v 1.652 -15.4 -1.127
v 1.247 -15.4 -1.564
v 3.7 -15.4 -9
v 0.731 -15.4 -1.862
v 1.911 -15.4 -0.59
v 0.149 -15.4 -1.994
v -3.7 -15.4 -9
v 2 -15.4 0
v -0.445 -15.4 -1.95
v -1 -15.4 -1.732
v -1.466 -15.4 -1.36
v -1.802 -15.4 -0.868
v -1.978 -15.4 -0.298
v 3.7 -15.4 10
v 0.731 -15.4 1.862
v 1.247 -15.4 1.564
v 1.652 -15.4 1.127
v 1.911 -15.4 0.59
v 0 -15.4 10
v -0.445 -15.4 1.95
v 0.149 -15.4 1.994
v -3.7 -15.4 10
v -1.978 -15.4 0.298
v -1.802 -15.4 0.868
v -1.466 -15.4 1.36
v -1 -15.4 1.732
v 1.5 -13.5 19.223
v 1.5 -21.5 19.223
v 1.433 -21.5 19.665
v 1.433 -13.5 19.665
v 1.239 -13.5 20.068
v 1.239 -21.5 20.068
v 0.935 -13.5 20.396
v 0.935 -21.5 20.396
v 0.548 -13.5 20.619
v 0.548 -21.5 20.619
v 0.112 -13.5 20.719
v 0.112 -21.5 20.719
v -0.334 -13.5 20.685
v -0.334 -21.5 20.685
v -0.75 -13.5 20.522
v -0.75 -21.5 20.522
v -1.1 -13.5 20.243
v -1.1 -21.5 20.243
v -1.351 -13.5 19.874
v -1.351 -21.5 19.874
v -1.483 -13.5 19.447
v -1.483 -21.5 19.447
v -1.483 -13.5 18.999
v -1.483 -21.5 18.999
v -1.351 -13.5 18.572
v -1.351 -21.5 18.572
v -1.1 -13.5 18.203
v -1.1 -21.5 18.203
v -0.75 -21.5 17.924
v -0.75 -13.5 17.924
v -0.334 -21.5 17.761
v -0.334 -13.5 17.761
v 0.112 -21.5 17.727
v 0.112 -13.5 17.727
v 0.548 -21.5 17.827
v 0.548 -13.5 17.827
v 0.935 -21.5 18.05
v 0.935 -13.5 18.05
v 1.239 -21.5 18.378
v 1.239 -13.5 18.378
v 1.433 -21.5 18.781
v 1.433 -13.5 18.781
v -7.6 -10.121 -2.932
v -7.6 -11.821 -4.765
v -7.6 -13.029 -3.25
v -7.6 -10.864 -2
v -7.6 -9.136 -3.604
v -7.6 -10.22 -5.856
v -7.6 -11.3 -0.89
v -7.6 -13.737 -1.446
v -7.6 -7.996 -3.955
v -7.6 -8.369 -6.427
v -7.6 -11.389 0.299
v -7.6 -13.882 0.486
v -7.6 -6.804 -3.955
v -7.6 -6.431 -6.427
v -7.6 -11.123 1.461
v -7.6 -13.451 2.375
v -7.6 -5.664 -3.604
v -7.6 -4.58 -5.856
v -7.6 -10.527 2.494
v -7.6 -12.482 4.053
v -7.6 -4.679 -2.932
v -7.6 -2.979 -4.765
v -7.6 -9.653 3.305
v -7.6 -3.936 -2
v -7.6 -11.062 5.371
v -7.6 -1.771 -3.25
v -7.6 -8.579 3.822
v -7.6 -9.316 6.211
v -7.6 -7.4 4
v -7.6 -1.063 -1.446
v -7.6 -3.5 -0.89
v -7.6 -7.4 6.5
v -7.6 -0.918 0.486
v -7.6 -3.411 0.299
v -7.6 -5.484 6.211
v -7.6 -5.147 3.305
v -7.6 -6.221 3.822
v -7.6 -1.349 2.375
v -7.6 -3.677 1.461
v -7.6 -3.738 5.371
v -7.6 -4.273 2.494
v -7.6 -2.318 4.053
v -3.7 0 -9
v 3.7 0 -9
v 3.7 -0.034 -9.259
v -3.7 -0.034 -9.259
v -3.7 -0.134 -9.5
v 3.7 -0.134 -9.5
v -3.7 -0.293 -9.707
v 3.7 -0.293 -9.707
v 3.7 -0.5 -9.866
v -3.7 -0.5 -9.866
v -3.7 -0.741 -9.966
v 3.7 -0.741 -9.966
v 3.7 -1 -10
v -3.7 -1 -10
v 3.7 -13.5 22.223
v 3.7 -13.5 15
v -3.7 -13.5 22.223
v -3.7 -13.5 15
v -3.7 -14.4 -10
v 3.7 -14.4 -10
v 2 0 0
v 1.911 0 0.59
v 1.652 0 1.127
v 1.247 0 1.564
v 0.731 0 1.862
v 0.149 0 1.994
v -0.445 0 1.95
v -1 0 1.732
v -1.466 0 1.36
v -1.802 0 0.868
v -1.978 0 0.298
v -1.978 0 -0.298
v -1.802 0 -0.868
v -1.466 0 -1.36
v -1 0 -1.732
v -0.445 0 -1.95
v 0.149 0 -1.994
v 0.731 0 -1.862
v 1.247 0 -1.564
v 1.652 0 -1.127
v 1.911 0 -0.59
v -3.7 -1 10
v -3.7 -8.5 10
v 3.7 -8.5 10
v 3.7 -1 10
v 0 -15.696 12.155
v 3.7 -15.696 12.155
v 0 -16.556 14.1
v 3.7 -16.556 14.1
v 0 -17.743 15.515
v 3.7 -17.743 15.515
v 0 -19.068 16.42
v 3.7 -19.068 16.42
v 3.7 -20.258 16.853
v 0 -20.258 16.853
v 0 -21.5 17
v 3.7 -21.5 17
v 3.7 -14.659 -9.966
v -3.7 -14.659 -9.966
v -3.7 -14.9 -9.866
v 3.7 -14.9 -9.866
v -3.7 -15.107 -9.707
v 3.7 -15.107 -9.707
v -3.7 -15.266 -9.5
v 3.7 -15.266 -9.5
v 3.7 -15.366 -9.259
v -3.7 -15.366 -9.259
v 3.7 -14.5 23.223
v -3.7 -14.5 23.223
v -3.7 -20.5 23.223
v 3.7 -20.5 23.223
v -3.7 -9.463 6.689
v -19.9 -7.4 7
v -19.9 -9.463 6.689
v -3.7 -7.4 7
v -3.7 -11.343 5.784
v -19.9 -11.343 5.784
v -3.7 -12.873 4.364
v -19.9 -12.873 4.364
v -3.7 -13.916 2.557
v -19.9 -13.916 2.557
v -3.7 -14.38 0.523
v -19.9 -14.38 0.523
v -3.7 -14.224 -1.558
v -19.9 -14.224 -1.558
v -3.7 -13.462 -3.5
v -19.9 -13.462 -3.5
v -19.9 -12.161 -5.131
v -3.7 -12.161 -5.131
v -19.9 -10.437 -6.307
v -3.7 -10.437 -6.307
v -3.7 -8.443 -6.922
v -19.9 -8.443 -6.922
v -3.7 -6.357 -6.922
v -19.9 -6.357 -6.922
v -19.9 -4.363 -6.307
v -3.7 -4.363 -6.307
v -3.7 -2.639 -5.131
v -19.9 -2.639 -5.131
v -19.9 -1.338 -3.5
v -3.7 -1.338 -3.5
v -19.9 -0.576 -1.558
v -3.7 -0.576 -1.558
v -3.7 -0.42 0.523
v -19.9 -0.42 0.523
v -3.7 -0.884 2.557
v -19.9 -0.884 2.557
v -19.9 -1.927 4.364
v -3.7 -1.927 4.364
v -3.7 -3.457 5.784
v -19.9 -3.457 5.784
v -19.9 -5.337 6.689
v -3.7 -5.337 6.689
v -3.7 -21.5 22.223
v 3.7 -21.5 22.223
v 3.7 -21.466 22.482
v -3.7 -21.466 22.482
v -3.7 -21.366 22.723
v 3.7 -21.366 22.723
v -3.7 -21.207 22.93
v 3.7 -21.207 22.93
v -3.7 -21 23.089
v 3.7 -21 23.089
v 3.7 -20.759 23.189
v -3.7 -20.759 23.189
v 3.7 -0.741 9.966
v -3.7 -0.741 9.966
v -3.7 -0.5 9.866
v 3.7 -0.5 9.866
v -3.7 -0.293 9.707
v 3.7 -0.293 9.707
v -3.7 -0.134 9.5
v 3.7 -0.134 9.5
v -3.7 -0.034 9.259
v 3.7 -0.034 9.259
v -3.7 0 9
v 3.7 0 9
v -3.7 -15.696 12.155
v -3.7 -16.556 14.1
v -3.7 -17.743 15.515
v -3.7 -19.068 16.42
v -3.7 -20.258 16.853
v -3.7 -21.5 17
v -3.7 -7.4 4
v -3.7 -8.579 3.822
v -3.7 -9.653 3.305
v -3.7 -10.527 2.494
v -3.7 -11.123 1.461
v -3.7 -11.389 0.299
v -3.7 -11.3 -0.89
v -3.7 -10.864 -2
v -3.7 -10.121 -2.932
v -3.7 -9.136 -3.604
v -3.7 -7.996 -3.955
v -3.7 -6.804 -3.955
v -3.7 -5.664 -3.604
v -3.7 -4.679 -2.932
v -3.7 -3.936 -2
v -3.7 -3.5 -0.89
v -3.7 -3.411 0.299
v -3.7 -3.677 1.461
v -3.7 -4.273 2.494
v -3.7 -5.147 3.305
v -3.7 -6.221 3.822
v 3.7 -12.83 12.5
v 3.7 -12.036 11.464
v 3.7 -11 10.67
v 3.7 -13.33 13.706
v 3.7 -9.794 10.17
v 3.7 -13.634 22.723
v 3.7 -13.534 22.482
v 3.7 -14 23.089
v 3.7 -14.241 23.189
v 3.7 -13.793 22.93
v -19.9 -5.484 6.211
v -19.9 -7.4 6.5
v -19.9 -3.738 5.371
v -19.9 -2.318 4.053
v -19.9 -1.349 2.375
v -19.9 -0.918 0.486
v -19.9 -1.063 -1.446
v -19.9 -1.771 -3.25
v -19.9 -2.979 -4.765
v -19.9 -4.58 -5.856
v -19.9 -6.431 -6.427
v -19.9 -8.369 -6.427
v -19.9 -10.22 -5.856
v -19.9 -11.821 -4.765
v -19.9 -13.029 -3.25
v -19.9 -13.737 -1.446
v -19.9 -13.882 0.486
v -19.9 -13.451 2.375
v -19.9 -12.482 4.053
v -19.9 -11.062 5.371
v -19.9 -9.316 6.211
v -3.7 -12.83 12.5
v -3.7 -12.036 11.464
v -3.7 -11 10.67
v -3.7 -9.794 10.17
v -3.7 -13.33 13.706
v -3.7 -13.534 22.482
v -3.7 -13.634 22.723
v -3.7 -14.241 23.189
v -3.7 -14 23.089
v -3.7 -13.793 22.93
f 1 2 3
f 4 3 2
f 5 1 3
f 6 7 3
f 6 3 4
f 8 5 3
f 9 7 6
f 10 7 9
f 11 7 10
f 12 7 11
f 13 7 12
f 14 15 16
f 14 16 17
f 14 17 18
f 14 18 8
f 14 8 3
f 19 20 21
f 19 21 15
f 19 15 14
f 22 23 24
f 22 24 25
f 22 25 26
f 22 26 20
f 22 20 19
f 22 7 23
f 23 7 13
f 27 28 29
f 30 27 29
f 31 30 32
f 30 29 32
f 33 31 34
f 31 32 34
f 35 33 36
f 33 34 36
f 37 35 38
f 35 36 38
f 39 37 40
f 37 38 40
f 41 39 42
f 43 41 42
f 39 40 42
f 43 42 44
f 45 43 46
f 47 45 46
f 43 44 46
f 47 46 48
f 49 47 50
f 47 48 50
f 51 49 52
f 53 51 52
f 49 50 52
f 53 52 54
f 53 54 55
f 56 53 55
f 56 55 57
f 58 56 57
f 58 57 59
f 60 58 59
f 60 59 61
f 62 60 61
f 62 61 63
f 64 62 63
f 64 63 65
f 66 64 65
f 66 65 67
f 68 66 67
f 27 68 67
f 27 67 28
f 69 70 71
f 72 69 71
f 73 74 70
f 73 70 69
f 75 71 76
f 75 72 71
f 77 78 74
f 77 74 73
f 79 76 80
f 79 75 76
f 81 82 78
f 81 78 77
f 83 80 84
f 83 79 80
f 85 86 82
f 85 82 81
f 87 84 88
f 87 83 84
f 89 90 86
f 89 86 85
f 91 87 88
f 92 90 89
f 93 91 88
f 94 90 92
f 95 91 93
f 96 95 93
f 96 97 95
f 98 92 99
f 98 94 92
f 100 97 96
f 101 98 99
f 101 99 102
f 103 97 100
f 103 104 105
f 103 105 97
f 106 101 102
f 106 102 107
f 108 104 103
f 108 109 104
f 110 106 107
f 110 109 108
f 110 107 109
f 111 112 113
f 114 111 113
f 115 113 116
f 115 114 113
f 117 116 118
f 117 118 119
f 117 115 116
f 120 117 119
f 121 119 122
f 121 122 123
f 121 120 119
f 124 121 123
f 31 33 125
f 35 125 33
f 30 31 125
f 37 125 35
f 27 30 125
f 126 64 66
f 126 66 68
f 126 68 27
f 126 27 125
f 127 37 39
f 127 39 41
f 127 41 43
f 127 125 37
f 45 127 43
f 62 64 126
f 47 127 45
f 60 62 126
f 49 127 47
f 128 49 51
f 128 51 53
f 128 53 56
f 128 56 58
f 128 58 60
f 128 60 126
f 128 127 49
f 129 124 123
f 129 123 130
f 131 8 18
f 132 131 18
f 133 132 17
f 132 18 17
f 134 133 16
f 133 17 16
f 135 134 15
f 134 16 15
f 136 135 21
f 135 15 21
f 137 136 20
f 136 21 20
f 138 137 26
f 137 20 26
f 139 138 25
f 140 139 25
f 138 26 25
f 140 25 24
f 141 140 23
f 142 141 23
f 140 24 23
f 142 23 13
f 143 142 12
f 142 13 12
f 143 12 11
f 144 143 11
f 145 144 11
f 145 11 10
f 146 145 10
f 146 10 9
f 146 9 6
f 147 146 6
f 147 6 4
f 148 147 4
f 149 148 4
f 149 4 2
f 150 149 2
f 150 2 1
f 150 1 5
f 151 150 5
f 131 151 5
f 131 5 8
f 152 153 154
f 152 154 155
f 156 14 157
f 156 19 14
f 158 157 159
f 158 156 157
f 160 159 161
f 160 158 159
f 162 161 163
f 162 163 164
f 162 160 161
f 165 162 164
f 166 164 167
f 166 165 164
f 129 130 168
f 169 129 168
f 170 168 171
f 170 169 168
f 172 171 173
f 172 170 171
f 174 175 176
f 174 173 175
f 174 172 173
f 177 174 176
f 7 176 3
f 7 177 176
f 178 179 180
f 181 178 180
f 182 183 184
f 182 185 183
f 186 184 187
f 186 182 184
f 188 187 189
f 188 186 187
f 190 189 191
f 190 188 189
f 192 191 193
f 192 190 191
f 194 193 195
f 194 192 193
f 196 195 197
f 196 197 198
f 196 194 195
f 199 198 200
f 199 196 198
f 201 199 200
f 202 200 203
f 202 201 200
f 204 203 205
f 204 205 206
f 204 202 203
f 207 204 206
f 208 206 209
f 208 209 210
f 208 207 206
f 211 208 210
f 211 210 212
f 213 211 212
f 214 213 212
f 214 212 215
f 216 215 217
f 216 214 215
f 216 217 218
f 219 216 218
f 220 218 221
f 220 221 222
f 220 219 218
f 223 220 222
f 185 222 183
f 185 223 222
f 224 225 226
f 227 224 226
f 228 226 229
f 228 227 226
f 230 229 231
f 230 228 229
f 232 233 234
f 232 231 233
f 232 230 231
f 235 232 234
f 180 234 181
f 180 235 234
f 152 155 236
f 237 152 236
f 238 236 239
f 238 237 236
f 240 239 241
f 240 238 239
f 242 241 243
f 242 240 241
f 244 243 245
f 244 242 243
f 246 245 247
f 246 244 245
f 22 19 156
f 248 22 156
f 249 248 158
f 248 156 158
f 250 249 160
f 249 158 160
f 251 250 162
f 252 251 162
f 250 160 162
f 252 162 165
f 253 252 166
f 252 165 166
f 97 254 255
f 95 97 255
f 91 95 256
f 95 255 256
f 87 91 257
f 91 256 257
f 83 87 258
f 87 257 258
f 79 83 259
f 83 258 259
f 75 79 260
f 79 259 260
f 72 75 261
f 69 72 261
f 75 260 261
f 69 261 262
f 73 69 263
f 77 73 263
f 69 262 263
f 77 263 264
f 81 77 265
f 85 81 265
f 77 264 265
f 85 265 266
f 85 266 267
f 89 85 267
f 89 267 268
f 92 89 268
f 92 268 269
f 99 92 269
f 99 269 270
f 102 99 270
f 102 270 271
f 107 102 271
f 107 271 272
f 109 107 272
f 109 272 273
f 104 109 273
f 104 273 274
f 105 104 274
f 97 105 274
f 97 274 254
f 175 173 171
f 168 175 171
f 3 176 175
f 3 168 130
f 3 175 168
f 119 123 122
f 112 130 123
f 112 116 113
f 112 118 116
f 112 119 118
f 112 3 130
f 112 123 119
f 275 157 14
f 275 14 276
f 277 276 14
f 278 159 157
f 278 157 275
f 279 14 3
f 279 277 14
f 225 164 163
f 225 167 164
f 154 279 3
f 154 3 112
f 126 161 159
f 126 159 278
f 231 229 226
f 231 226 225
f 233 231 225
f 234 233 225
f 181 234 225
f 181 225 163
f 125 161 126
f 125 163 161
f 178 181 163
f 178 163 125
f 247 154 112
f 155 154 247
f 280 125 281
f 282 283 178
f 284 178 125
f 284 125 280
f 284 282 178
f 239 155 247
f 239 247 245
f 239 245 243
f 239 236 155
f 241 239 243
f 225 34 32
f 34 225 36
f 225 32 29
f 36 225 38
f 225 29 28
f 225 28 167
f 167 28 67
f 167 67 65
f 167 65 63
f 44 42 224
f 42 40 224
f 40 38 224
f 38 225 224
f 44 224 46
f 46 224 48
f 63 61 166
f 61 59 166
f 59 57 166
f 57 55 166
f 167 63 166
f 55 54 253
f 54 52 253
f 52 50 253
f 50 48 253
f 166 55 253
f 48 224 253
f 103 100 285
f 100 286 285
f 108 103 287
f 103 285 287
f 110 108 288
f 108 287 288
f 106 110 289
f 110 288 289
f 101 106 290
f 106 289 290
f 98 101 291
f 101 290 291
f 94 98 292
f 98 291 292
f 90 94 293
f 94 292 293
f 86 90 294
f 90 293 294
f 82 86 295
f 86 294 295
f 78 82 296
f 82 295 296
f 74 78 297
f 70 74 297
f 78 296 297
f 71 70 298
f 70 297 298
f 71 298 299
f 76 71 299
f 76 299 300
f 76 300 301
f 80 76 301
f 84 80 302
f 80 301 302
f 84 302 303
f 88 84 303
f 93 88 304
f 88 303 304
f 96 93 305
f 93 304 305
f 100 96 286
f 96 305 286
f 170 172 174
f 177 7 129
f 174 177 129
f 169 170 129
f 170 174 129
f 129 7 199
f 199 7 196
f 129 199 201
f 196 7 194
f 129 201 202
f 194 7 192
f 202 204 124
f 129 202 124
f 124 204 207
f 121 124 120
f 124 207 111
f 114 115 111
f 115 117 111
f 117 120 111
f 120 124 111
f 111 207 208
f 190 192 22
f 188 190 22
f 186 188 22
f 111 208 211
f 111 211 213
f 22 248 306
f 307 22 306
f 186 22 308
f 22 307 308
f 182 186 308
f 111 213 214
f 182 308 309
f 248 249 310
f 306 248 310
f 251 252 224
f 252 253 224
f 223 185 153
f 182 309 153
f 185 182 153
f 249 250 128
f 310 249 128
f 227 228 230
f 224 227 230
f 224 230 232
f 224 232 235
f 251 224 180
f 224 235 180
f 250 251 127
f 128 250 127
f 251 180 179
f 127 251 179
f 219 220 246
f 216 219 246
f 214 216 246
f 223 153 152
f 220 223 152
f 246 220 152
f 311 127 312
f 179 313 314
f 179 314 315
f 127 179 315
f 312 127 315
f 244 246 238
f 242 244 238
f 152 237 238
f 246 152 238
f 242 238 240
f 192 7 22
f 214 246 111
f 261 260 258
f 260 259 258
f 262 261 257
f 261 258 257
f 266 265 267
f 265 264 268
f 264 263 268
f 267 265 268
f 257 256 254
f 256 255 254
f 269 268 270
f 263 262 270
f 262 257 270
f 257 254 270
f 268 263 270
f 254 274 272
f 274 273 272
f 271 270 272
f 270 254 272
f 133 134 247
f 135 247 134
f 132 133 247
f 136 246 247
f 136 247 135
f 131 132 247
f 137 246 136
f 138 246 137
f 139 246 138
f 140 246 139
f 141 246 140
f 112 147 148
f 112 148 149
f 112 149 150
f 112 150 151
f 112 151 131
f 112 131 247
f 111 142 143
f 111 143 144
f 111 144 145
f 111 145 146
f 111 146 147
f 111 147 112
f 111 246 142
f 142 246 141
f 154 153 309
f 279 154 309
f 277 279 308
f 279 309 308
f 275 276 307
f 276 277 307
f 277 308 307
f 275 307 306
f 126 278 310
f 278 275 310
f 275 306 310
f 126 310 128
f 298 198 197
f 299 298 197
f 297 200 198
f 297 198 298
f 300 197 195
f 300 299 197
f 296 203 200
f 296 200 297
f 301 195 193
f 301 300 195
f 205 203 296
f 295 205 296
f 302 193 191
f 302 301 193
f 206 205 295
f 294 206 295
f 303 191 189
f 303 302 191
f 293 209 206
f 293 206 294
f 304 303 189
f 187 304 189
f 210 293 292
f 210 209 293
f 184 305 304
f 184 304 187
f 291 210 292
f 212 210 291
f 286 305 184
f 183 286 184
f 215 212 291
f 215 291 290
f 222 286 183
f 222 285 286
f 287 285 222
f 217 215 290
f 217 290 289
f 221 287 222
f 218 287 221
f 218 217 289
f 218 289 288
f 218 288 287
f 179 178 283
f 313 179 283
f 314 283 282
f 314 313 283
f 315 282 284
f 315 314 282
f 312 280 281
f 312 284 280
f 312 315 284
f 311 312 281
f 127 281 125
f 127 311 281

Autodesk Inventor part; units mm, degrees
sketch "Sketch5" plane through (0, 0, 0) normal (1, 0, 0) x (0, 1, 0)
  line L0 (-8.5, 10) -> (0, 10)
  line L1 (0, 10) -> (0, -10)
  line L2 (0, -10) -> (-14.4, -10)
  line L3 (-15.4, -9) -> (-15.4, 10)
  line L4 (-26.0485, 0) -> (4.3414, 0) projected
  line L5 (0, -16.9345) -> (0, 30.1575) projected
  line L6 (-14.5, 23.223) -> (-20.5, 23.223)
  line L7 (-21.5, 22.223) -> (-21.5, 17)
  ellipse E0 centre (-21.5, 10) end of major axis (-21.5, 17) minor radius 6.1 (-15.4, 10) -> (-21.5, 17) ccw
  line L8 (-13.5, 22.223) -> (-13.5, 15)
  arc A0 (-20.5, 23.223) -> (-21.5, 22.223) centre (-20.5, 22.223) ccw
  arc A1 (-13.5, 22.223) -> (-14.5, 23.223) centre (-14.5, 22.223) ccw
  arc A2 (-15.4, -9) -> (-14.4, -10) centre (-14.4, -9) ccw
  arc A3 (-13.5, 15) -> (-8.5, 10) centre (-8.5, 15) ccw
  point P0 (0, 0)
  point P1 (-15.4, -10)
  point P2 (-13.5, 10)
  dimension "d64" = 6.1
  dimension "d78" = 7
  dimension "d31" = 15.4
  dimension "d32" = 20
  dimension "d33" = 10
  dimension "d34" = 15.4
  dimension "d58" = 21.5
  dimension "d59" = 23.223
  dimension "d71" = 8
  dimension "d74" = 1
  dimension "d75" = 1
  dimension "d76" = 0
  dimension "d77" = 5
extrude "Extrusion4" add sketch "Sketch5" along normal mid plane 7.4
sketch "Sketch6" plane through (-3.7, -15.4, -10) normal (0, -1, 0) x (1, 0, 0)
  circle A0 centre (3.7, 10) radius 2
  line L0 (3.7, 39.8676) -> (3.7, -6.6446) projected
  point P0 (3.7, 10)
  dimension "d37" = 4
extrude "Extrusion5" cut sketch "Sketch6" against normal blind 15.5
sketch "Sketch7" plane through (-3.7, 0, 0) normal (-1, 0, 0) x (0, 0, 1)
  circle A0 centre (0, -7.4) radius 7
  line L0 (10, 0) -> (-10, 0) projected
  line L1 (0, -25.8) -> (0, 4.3) projected
  circle A1 centre (0, -7.4) radius 4
  point P0 (0, 0)
  dimension "d40" = 14
  dimension "d41" = 7.4
  dimension "d42" = 0
  dimension "d43" = 8
extrude "Extrusion6" add sketch "Sketch7" along normal blind 16.2 contours A0 L1 A1 | L1 A1 A0
sketch "Sketch8" plane through (-19.9, -7.4, 0) normal (-1, 0, 0) x (0, 0, 1)
  circle A0 centre (0, 0) radius 6.5
  line L0 (0, 11.7) -> (0, -18.4) projected
  line L1 (10, 7.4) -> (-10, 7.4) projected
  point P0 (0, 7.4)
  dimension "d46" = 13
  dimension "d47" = 0
  dimension "d48" = 7.4
extrude "Extrusion7" cut sketch "Sketch8" against normal blind 12.3
sketch "Sketch10" plane through (-3.7, -21.5, 17) normal (0, -1, 0) x (1, 0, 0)
  circle A0 centre (3.7, 2.223) radius 1.5
  line L0 (-1.48, -17) -> (8.88, -17) projected
  line L1 (3.7, 12.8676) -> (3.7, -33.6446) projected
  point P0 (3.7, -17)
  dimension "d82" = 3
  dimension "d83" = 19.223
  dimension "d84" = 0
extrude "Extrusion8" cut sketch "Sketch10" against normal blind 8
fillet "Fillet1" radius 1 1 edges at (0, 0, -10)
fillet "Fillet2" radius 1 1 edges at (0, 0, 10)
properties part number "support_avant"
